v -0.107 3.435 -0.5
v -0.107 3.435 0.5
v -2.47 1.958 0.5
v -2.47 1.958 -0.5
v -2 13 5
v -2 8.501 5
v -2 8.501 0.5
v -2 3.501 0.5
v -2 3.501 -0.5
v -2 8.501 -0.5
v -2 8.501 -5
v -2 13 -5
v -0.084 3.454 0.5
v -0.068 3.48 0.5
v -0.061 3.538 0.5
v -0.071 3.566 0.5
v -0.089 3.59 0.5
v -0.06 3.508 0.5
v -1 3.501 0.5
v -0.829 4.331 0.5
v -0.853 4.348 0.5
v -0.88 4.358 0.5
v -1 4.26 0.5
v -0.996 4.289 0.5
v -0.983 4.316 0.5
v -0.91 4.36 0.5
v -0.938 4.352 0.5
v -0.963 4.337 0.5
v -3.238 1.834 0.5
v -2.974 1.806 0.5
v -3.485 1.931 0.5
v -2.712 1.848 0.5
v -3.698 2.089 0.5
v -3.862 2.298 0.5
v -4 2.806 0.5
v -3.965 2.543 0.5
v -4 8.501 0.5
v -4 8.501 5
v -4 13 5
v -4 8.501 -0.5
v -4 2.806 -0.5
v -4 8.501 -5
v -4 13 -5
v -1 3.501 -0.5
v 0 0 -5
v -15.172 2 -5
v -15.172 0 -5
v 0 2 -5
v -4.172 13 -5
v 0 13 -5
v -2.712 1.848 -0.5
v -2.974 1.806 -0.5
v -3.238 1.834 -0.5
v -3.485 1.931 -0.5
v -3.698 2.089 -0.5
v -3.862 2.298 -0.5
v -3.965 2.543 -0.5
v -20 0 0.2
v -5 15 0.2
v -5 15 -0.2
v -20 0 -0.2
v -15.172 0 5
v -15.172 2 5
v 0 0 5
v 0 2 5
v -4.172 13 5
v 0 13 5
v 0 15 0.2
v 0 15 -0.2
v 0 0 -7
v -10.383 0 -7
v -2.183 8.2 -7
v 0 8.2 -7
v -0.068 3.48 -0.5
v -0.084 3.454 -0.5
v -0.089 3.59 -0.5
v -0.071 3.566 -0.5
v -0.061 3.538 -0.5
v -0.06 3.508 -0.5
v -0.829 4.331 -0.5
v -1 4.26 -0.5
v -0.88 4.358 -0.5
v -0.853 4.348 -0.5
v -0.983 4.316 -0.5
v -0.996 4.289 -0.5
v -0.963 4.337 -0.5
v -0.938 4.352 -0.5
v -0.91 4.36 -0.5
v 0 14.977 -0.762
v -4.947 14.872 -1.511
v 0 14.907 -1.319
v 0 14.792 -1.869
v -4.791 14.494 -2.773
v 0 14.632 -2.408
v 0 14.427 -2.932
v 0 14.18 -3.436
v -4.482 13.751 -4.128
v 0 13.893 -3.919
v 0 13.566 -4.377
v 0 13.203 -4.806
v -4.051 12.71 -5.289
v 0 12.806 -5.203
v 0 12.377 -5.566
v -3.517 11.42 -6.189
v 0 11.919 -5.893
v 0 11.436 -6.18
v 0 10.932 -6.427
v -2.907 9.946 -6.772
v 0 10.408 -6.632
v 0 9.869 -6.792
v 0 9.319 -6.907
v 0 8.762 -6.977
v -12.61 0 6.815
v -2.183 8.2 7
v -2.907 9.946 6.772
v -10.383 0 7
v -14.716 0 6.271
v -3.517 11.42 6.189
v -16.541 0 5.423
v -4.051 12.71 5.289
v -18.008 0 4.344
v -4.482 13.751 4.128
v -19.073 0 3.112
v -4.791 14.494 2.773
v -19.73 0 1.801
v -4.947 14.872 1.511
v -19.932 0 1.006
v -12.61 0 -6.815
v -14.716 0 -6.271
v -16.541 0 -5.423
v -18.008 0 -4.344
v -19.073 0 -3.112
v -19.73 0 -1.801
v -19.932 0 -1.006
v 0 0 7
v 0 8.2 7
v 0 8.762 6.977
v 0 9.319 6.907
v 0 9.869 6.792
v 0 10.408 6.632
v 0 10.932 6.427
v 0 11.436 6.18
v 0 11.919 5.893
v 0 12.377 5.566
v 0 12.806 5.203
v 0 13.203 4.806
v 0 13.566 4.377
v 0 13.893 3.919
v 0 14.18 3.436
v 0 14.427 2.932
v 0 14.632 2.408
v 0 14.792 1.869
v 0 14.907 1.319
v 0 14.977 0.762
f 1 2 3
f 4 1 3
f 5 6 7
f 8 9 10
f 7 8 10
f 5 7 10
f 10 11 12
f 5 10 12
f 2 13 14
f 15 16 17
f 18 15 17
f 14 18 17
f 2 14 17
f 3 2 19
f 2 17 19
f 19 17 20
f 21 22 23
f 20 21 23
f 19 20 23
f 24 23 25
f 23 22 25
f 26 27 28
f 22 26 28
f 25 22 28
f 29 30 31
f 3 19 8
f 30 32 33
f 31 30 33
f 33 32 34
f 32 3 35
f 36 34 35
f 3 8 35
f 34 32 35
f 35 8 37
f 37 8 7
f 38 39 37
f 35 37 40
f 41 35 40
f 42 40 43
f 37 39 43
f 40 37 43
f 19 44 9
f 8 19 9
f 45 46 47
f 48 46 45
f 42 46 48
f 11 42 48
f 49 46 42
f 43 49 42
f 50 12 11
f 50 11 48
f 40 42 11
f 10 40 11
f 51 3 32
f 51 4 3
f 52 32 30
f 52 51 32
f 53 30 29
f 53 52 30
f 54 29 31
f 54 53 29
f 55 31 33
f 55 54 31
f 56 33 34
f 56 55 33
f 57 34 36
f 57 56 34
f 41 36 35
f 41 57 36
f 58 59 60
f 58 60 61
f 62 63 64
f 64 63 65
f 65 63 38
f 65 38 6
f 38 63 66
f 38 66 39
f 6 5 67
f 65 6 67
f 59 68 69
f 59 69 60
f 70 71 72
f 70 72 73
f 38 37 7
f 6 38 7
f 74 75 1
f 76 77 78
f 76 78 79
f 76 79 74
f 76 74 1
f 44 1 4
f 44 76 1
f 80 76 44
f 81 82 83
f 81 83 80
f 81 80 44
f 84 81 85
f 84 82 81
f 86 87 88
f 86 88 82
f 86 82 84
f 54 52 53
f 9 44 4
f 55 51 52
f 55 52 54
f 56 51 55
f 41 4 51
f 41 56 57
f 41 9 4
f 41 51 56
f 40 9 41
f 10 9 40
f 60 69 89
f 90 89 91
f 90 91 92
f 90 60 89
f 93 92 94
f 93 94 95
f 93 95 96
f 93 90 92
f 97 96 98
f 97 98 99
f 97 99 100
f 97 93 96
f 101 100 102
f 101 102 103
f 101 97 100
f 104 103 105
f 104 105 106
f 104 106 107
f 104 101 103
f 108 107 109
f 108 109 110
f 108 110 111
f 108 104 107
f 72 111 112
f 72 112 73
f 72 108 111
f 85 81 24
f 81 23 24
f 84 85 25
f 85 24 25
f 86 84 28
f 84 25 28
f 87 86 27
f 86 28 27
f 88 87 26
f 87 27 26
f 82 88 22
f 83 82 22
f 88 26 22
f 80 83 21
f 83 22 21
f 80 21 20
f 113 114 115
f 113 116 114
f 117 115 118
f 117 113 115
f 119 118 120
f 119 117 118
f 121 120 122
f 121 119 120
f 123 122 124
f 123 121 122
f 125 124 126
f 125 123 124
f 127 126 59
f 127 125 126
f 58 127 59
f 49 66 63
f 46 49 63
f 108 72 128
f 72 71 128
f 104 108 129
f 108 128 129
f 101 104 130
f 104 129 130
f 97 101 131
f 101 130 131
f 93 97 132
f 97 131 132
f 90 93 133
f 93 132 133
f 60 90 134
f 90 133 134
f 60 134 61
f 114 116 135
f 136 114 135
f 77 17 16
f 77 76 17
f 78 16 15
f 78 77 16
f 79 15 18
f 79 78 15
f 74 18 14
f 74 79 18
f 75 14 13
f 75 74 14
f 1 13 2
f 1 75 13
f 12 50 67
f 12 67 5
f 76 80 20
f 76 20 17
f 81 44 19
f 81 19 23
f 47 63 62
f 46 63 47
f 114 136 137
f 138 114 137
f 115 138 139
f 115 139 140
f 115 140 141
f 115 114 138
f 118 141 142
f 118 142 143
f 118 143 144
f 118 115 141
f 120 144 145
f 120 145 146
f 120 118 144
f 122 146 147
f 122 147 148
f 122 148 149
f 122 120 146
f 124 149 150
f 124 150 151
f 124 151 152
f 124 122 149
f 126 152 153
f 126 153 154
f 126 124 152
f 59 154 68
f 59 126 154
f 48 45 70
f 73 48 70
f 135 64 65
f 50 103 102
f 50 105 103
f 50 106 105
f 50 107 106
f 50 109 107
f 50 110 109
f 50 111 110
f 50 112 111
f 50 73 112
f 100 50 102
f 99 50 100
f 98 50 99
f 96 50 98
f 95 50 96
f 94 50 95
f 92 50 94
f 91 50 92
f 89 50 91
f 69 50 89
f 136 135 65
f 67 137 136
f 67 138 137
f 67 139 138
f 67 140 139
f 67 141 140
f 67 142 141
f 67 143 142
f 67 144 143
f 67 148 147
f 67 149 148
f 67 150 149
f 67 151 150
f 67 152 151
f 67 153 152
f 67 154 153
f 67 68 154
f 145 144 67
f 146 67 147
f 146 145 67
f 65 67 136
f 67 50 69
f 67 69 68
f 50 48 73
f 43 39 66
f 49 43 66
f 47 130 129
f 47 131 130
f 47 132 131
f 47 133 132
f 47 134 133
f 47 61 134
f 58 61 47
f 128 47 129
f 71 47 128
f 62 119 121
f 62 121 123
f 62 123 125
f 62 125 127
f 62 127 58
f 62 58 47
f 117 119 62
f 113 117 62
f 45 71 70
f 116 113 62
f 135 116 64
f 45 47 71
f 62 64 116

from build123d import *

# Parameters (mm, degrees)
BOSS_EXTRUDE1_DEPTH = 7
SHELL1_T            = -2
BOSS_EXTRUDE2_REACH = 14
SKETCH2_W           = 2
SKETCH2_H           = 10
SKETCH3_W           = 2
SKETCH3_H           = 1
BOSS_EXTRUDE3_DEPTH = 5
SKETCH4_W           = 15.171572875
SKETCH4_H           = 10
CUT_EXTRUDE1_DEPTH  = 5
SKETCH5_W           = 4
SKETCH5_H           = 1
BOSS_EXTRUDE4_DEPTH = 2.5
CUT_EXTRUDE2_REACH  = 9.5
BOSS_EXTRUDE5_START = -1
BOSS_EXTRUDE5_DEPTH = 1
FILLET2_R           = 0.1
FILLET3_R           = 1
FILLET4_R           = 6.8


with BuildPart() as part:
    # Sketch1 → Boss-Extrude1 (new body, symmetric)
    with BuildSketch(Plane.XY):
        Polygon((0, 0), (0, 15), (-5, 15), (-20, 0), align=None)
    extrude(amount=BOSS_EXTRUDE1_DEPTH, both=True)

    # Shell1
    shell1_openings = [part.faces().sort_by_distance(p)[0] for p in [
        (0, 7.5, 0),
    ]]
    offset(amount=SHELL1_T, openings=shell1_openings, kind=Kind.INTERSECTION)

    # Sketch2 → Boss-Extrude2 (add, up to next)
    with BuildSketch(Plane.XY.offset(-5), mode=Mode.PRIVATE) as boss_extrude2_sk1:
        with Locations((-3, 13.501498051)):
            Rectangle(SKETCH2_W, SKETCH2_H)
    boss_extrude2_tool1 = extrude(boss_extrude2_sk1.sketch, amount=BOSS_EXTRUDE2_REACH, mode=Mode.PRIVATE) - part.part
    add(boss_extrude2_tool1.solids().sort_by_distance((-3, 13.501498, -5))[0])

    # Sketch3 → Boss-Extrude3 (add)
    with BuildSketch(Plane.XZ.offset(-8.501498051)):
        with Locations((-3, 0)):
            Rectangle(SKETCH3_W, SKETCH3_H)
    extrude(amount=BOSS_EXTRUDE3_DEPTH)

    # Sketch4 → Cut-Extrude1 (cut)
    with BuildSketch(Plane(origin=(0, 2, 0), x_dir=(1, 0, 0), z_dir=(0, 1, 0))):
        with Locations((-7.585786438, 0)):
            Rectangle(SKETCH4_W, SKETCH4_H)
    extrude(amount=-CUT_EXTRUDE1_DEPTH, mode=Mode.SUBTRACT)

    # Sketch5 → Boss-Extrude4 (add)
    with BuildSketch(Plane(origin=(0, 3.501498051, 0), x_dir=(-1, 0, 0), z_dir=(0, -1, 0))):
        with Locations((2, 0)):
            Rectangle(SKETCH5_W, SKETCH5_H)
    extrude(amount=BOSS_EXTRUDE4_DEPTH)

    # Sketch6 → Cut-Extrude2 (cut, up to next)
    with BuildSketch(Plane.XY.offset(0.5), mode=Mode.PRIVATE) as cut_extrude2_sk1:
        Polygon((0, 3.501498051), (-4, 1.001498051), (0, 1.001498051), align=None)
    cut_extrude2_tool1 = extrude(cut_extrude2_sk1.sketch, amount=-CUT_EXTRUDE2_REACH, mode=Mode.PRIVATE) & part.part
    add(cut_extrude2_tool1.solids().sort_by_distance((-1.333333, 1.834831, 0.5))[0], mode=Mode.SUBTRACT)

    # Sketch7 → Boss-Extrude5 (add)
    with BuildSketch(Plane.XY.offset(0.5).offset(BOSS_EXTRUDE5_START)):
        Polygon((0, 3.501498051), (-1, 3.501498051), (-1, 4.501498051), align=None)
    extrude(amount=BOSS_EXTRUDE5_DEPTH)

    # Fillet2
    fillet2_edges = [part.edges().sort_by_distance(p)[0] for p in [
        (0, 3.501498051, 0),
        (-1, 4.501498051, 0),
    ]]
    fillet(fillet2_edges, radius=FILLET2_R)

    # Fillet3
    fillet3_edges = [part.edges().sort_by_distance(p)[0] for p in [
        (-4, 1.001498051, 0),
    ]]
    fillet(fillet3_edges, radius=FILLET3_R)

    # Fillet4
    fillet4_edges = [part.edges().sort_by_distance(p)[0] for p in [
        (-2.5, 15, 7),
        (-12.5, 7.5, 7),
        (-12.5, 7.5, -7),
        (-2.5, 15, -7),
    ]]
    fillet(fillet4_edges, radius=FILLET4_R)


solid = part.part
